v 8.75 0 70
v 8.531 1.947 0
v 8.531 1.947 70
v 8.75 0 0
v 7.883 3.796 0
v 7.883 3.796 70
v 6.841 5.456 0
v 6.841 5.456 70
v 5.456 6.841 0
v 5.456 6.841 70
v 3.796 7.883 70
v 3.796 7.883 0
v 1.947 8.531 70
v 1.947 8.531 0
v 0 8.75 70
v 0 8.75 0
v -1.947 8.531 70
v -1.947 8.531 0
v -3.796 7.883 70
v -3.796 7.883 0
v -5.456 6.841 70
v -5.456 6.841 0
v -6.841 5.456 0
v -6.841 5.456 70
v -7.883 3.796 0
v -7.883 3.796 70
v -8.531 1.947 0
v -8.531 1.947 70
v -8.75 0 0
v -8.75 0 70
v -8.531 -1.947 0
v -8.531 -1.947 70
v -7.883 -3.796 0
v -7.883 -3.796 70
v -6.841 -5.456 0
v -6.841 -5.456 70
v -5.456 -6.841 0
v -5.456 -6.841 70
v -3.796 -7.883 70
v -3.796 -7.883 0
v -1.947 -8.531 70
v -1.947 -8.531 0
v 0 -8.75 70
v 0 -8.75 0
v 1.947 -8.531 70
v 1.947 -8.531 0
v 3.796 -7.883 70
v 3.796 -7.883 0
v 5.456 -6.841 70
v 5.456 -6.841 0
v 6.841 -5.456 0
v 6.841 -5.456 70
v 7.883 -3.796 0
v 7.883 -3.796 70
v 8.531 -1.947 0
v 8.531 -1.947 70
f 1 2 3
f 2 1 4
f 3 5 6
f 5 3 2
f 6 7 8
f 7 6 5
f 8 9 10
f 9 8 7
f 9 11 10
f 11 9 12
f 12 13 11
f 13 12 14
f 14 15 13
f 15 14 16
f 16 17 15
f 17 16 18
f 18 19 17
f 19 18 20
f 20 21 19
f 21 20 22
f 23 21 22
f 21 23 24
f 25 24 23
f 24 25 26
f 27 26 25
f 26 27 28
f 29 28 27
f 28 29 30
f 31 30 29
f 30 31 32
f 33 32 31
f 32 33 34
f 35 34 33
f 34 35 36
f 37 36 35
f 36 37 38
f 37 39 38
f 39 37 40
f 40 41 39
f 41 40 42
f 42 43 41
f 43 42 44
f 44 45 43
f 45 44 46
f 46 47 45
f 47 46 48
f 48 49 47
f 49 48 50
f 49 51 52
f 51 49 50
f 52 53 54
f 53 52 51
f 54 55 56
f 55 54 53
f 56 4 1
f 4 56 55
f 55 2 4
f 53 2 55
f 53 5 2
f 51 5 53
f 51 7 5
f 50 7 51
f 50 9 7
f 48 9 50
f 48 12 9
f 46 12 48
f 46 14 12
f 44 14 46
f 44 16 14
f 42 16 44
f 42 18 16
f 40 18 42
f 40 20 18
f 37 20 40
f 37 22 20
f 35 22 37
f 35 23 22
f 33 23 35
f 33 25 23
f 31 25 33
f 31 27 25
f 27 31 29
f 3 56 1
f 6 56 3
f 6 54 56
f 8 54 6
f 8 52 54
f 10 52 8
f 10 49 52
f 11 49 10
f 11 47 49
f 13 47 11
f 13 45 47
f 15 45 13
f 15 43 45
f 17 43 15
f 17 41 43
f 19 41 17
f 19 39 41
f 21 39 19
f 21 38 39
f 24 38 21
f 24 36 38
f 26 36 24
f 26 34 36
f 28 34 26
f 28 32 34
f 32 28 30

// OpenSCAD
// buri.scad

engine_radius = 17.5 / 2;
engine_height = 70;

// the engine
cylinder(engine_height, engine_radius, engine_radius);
